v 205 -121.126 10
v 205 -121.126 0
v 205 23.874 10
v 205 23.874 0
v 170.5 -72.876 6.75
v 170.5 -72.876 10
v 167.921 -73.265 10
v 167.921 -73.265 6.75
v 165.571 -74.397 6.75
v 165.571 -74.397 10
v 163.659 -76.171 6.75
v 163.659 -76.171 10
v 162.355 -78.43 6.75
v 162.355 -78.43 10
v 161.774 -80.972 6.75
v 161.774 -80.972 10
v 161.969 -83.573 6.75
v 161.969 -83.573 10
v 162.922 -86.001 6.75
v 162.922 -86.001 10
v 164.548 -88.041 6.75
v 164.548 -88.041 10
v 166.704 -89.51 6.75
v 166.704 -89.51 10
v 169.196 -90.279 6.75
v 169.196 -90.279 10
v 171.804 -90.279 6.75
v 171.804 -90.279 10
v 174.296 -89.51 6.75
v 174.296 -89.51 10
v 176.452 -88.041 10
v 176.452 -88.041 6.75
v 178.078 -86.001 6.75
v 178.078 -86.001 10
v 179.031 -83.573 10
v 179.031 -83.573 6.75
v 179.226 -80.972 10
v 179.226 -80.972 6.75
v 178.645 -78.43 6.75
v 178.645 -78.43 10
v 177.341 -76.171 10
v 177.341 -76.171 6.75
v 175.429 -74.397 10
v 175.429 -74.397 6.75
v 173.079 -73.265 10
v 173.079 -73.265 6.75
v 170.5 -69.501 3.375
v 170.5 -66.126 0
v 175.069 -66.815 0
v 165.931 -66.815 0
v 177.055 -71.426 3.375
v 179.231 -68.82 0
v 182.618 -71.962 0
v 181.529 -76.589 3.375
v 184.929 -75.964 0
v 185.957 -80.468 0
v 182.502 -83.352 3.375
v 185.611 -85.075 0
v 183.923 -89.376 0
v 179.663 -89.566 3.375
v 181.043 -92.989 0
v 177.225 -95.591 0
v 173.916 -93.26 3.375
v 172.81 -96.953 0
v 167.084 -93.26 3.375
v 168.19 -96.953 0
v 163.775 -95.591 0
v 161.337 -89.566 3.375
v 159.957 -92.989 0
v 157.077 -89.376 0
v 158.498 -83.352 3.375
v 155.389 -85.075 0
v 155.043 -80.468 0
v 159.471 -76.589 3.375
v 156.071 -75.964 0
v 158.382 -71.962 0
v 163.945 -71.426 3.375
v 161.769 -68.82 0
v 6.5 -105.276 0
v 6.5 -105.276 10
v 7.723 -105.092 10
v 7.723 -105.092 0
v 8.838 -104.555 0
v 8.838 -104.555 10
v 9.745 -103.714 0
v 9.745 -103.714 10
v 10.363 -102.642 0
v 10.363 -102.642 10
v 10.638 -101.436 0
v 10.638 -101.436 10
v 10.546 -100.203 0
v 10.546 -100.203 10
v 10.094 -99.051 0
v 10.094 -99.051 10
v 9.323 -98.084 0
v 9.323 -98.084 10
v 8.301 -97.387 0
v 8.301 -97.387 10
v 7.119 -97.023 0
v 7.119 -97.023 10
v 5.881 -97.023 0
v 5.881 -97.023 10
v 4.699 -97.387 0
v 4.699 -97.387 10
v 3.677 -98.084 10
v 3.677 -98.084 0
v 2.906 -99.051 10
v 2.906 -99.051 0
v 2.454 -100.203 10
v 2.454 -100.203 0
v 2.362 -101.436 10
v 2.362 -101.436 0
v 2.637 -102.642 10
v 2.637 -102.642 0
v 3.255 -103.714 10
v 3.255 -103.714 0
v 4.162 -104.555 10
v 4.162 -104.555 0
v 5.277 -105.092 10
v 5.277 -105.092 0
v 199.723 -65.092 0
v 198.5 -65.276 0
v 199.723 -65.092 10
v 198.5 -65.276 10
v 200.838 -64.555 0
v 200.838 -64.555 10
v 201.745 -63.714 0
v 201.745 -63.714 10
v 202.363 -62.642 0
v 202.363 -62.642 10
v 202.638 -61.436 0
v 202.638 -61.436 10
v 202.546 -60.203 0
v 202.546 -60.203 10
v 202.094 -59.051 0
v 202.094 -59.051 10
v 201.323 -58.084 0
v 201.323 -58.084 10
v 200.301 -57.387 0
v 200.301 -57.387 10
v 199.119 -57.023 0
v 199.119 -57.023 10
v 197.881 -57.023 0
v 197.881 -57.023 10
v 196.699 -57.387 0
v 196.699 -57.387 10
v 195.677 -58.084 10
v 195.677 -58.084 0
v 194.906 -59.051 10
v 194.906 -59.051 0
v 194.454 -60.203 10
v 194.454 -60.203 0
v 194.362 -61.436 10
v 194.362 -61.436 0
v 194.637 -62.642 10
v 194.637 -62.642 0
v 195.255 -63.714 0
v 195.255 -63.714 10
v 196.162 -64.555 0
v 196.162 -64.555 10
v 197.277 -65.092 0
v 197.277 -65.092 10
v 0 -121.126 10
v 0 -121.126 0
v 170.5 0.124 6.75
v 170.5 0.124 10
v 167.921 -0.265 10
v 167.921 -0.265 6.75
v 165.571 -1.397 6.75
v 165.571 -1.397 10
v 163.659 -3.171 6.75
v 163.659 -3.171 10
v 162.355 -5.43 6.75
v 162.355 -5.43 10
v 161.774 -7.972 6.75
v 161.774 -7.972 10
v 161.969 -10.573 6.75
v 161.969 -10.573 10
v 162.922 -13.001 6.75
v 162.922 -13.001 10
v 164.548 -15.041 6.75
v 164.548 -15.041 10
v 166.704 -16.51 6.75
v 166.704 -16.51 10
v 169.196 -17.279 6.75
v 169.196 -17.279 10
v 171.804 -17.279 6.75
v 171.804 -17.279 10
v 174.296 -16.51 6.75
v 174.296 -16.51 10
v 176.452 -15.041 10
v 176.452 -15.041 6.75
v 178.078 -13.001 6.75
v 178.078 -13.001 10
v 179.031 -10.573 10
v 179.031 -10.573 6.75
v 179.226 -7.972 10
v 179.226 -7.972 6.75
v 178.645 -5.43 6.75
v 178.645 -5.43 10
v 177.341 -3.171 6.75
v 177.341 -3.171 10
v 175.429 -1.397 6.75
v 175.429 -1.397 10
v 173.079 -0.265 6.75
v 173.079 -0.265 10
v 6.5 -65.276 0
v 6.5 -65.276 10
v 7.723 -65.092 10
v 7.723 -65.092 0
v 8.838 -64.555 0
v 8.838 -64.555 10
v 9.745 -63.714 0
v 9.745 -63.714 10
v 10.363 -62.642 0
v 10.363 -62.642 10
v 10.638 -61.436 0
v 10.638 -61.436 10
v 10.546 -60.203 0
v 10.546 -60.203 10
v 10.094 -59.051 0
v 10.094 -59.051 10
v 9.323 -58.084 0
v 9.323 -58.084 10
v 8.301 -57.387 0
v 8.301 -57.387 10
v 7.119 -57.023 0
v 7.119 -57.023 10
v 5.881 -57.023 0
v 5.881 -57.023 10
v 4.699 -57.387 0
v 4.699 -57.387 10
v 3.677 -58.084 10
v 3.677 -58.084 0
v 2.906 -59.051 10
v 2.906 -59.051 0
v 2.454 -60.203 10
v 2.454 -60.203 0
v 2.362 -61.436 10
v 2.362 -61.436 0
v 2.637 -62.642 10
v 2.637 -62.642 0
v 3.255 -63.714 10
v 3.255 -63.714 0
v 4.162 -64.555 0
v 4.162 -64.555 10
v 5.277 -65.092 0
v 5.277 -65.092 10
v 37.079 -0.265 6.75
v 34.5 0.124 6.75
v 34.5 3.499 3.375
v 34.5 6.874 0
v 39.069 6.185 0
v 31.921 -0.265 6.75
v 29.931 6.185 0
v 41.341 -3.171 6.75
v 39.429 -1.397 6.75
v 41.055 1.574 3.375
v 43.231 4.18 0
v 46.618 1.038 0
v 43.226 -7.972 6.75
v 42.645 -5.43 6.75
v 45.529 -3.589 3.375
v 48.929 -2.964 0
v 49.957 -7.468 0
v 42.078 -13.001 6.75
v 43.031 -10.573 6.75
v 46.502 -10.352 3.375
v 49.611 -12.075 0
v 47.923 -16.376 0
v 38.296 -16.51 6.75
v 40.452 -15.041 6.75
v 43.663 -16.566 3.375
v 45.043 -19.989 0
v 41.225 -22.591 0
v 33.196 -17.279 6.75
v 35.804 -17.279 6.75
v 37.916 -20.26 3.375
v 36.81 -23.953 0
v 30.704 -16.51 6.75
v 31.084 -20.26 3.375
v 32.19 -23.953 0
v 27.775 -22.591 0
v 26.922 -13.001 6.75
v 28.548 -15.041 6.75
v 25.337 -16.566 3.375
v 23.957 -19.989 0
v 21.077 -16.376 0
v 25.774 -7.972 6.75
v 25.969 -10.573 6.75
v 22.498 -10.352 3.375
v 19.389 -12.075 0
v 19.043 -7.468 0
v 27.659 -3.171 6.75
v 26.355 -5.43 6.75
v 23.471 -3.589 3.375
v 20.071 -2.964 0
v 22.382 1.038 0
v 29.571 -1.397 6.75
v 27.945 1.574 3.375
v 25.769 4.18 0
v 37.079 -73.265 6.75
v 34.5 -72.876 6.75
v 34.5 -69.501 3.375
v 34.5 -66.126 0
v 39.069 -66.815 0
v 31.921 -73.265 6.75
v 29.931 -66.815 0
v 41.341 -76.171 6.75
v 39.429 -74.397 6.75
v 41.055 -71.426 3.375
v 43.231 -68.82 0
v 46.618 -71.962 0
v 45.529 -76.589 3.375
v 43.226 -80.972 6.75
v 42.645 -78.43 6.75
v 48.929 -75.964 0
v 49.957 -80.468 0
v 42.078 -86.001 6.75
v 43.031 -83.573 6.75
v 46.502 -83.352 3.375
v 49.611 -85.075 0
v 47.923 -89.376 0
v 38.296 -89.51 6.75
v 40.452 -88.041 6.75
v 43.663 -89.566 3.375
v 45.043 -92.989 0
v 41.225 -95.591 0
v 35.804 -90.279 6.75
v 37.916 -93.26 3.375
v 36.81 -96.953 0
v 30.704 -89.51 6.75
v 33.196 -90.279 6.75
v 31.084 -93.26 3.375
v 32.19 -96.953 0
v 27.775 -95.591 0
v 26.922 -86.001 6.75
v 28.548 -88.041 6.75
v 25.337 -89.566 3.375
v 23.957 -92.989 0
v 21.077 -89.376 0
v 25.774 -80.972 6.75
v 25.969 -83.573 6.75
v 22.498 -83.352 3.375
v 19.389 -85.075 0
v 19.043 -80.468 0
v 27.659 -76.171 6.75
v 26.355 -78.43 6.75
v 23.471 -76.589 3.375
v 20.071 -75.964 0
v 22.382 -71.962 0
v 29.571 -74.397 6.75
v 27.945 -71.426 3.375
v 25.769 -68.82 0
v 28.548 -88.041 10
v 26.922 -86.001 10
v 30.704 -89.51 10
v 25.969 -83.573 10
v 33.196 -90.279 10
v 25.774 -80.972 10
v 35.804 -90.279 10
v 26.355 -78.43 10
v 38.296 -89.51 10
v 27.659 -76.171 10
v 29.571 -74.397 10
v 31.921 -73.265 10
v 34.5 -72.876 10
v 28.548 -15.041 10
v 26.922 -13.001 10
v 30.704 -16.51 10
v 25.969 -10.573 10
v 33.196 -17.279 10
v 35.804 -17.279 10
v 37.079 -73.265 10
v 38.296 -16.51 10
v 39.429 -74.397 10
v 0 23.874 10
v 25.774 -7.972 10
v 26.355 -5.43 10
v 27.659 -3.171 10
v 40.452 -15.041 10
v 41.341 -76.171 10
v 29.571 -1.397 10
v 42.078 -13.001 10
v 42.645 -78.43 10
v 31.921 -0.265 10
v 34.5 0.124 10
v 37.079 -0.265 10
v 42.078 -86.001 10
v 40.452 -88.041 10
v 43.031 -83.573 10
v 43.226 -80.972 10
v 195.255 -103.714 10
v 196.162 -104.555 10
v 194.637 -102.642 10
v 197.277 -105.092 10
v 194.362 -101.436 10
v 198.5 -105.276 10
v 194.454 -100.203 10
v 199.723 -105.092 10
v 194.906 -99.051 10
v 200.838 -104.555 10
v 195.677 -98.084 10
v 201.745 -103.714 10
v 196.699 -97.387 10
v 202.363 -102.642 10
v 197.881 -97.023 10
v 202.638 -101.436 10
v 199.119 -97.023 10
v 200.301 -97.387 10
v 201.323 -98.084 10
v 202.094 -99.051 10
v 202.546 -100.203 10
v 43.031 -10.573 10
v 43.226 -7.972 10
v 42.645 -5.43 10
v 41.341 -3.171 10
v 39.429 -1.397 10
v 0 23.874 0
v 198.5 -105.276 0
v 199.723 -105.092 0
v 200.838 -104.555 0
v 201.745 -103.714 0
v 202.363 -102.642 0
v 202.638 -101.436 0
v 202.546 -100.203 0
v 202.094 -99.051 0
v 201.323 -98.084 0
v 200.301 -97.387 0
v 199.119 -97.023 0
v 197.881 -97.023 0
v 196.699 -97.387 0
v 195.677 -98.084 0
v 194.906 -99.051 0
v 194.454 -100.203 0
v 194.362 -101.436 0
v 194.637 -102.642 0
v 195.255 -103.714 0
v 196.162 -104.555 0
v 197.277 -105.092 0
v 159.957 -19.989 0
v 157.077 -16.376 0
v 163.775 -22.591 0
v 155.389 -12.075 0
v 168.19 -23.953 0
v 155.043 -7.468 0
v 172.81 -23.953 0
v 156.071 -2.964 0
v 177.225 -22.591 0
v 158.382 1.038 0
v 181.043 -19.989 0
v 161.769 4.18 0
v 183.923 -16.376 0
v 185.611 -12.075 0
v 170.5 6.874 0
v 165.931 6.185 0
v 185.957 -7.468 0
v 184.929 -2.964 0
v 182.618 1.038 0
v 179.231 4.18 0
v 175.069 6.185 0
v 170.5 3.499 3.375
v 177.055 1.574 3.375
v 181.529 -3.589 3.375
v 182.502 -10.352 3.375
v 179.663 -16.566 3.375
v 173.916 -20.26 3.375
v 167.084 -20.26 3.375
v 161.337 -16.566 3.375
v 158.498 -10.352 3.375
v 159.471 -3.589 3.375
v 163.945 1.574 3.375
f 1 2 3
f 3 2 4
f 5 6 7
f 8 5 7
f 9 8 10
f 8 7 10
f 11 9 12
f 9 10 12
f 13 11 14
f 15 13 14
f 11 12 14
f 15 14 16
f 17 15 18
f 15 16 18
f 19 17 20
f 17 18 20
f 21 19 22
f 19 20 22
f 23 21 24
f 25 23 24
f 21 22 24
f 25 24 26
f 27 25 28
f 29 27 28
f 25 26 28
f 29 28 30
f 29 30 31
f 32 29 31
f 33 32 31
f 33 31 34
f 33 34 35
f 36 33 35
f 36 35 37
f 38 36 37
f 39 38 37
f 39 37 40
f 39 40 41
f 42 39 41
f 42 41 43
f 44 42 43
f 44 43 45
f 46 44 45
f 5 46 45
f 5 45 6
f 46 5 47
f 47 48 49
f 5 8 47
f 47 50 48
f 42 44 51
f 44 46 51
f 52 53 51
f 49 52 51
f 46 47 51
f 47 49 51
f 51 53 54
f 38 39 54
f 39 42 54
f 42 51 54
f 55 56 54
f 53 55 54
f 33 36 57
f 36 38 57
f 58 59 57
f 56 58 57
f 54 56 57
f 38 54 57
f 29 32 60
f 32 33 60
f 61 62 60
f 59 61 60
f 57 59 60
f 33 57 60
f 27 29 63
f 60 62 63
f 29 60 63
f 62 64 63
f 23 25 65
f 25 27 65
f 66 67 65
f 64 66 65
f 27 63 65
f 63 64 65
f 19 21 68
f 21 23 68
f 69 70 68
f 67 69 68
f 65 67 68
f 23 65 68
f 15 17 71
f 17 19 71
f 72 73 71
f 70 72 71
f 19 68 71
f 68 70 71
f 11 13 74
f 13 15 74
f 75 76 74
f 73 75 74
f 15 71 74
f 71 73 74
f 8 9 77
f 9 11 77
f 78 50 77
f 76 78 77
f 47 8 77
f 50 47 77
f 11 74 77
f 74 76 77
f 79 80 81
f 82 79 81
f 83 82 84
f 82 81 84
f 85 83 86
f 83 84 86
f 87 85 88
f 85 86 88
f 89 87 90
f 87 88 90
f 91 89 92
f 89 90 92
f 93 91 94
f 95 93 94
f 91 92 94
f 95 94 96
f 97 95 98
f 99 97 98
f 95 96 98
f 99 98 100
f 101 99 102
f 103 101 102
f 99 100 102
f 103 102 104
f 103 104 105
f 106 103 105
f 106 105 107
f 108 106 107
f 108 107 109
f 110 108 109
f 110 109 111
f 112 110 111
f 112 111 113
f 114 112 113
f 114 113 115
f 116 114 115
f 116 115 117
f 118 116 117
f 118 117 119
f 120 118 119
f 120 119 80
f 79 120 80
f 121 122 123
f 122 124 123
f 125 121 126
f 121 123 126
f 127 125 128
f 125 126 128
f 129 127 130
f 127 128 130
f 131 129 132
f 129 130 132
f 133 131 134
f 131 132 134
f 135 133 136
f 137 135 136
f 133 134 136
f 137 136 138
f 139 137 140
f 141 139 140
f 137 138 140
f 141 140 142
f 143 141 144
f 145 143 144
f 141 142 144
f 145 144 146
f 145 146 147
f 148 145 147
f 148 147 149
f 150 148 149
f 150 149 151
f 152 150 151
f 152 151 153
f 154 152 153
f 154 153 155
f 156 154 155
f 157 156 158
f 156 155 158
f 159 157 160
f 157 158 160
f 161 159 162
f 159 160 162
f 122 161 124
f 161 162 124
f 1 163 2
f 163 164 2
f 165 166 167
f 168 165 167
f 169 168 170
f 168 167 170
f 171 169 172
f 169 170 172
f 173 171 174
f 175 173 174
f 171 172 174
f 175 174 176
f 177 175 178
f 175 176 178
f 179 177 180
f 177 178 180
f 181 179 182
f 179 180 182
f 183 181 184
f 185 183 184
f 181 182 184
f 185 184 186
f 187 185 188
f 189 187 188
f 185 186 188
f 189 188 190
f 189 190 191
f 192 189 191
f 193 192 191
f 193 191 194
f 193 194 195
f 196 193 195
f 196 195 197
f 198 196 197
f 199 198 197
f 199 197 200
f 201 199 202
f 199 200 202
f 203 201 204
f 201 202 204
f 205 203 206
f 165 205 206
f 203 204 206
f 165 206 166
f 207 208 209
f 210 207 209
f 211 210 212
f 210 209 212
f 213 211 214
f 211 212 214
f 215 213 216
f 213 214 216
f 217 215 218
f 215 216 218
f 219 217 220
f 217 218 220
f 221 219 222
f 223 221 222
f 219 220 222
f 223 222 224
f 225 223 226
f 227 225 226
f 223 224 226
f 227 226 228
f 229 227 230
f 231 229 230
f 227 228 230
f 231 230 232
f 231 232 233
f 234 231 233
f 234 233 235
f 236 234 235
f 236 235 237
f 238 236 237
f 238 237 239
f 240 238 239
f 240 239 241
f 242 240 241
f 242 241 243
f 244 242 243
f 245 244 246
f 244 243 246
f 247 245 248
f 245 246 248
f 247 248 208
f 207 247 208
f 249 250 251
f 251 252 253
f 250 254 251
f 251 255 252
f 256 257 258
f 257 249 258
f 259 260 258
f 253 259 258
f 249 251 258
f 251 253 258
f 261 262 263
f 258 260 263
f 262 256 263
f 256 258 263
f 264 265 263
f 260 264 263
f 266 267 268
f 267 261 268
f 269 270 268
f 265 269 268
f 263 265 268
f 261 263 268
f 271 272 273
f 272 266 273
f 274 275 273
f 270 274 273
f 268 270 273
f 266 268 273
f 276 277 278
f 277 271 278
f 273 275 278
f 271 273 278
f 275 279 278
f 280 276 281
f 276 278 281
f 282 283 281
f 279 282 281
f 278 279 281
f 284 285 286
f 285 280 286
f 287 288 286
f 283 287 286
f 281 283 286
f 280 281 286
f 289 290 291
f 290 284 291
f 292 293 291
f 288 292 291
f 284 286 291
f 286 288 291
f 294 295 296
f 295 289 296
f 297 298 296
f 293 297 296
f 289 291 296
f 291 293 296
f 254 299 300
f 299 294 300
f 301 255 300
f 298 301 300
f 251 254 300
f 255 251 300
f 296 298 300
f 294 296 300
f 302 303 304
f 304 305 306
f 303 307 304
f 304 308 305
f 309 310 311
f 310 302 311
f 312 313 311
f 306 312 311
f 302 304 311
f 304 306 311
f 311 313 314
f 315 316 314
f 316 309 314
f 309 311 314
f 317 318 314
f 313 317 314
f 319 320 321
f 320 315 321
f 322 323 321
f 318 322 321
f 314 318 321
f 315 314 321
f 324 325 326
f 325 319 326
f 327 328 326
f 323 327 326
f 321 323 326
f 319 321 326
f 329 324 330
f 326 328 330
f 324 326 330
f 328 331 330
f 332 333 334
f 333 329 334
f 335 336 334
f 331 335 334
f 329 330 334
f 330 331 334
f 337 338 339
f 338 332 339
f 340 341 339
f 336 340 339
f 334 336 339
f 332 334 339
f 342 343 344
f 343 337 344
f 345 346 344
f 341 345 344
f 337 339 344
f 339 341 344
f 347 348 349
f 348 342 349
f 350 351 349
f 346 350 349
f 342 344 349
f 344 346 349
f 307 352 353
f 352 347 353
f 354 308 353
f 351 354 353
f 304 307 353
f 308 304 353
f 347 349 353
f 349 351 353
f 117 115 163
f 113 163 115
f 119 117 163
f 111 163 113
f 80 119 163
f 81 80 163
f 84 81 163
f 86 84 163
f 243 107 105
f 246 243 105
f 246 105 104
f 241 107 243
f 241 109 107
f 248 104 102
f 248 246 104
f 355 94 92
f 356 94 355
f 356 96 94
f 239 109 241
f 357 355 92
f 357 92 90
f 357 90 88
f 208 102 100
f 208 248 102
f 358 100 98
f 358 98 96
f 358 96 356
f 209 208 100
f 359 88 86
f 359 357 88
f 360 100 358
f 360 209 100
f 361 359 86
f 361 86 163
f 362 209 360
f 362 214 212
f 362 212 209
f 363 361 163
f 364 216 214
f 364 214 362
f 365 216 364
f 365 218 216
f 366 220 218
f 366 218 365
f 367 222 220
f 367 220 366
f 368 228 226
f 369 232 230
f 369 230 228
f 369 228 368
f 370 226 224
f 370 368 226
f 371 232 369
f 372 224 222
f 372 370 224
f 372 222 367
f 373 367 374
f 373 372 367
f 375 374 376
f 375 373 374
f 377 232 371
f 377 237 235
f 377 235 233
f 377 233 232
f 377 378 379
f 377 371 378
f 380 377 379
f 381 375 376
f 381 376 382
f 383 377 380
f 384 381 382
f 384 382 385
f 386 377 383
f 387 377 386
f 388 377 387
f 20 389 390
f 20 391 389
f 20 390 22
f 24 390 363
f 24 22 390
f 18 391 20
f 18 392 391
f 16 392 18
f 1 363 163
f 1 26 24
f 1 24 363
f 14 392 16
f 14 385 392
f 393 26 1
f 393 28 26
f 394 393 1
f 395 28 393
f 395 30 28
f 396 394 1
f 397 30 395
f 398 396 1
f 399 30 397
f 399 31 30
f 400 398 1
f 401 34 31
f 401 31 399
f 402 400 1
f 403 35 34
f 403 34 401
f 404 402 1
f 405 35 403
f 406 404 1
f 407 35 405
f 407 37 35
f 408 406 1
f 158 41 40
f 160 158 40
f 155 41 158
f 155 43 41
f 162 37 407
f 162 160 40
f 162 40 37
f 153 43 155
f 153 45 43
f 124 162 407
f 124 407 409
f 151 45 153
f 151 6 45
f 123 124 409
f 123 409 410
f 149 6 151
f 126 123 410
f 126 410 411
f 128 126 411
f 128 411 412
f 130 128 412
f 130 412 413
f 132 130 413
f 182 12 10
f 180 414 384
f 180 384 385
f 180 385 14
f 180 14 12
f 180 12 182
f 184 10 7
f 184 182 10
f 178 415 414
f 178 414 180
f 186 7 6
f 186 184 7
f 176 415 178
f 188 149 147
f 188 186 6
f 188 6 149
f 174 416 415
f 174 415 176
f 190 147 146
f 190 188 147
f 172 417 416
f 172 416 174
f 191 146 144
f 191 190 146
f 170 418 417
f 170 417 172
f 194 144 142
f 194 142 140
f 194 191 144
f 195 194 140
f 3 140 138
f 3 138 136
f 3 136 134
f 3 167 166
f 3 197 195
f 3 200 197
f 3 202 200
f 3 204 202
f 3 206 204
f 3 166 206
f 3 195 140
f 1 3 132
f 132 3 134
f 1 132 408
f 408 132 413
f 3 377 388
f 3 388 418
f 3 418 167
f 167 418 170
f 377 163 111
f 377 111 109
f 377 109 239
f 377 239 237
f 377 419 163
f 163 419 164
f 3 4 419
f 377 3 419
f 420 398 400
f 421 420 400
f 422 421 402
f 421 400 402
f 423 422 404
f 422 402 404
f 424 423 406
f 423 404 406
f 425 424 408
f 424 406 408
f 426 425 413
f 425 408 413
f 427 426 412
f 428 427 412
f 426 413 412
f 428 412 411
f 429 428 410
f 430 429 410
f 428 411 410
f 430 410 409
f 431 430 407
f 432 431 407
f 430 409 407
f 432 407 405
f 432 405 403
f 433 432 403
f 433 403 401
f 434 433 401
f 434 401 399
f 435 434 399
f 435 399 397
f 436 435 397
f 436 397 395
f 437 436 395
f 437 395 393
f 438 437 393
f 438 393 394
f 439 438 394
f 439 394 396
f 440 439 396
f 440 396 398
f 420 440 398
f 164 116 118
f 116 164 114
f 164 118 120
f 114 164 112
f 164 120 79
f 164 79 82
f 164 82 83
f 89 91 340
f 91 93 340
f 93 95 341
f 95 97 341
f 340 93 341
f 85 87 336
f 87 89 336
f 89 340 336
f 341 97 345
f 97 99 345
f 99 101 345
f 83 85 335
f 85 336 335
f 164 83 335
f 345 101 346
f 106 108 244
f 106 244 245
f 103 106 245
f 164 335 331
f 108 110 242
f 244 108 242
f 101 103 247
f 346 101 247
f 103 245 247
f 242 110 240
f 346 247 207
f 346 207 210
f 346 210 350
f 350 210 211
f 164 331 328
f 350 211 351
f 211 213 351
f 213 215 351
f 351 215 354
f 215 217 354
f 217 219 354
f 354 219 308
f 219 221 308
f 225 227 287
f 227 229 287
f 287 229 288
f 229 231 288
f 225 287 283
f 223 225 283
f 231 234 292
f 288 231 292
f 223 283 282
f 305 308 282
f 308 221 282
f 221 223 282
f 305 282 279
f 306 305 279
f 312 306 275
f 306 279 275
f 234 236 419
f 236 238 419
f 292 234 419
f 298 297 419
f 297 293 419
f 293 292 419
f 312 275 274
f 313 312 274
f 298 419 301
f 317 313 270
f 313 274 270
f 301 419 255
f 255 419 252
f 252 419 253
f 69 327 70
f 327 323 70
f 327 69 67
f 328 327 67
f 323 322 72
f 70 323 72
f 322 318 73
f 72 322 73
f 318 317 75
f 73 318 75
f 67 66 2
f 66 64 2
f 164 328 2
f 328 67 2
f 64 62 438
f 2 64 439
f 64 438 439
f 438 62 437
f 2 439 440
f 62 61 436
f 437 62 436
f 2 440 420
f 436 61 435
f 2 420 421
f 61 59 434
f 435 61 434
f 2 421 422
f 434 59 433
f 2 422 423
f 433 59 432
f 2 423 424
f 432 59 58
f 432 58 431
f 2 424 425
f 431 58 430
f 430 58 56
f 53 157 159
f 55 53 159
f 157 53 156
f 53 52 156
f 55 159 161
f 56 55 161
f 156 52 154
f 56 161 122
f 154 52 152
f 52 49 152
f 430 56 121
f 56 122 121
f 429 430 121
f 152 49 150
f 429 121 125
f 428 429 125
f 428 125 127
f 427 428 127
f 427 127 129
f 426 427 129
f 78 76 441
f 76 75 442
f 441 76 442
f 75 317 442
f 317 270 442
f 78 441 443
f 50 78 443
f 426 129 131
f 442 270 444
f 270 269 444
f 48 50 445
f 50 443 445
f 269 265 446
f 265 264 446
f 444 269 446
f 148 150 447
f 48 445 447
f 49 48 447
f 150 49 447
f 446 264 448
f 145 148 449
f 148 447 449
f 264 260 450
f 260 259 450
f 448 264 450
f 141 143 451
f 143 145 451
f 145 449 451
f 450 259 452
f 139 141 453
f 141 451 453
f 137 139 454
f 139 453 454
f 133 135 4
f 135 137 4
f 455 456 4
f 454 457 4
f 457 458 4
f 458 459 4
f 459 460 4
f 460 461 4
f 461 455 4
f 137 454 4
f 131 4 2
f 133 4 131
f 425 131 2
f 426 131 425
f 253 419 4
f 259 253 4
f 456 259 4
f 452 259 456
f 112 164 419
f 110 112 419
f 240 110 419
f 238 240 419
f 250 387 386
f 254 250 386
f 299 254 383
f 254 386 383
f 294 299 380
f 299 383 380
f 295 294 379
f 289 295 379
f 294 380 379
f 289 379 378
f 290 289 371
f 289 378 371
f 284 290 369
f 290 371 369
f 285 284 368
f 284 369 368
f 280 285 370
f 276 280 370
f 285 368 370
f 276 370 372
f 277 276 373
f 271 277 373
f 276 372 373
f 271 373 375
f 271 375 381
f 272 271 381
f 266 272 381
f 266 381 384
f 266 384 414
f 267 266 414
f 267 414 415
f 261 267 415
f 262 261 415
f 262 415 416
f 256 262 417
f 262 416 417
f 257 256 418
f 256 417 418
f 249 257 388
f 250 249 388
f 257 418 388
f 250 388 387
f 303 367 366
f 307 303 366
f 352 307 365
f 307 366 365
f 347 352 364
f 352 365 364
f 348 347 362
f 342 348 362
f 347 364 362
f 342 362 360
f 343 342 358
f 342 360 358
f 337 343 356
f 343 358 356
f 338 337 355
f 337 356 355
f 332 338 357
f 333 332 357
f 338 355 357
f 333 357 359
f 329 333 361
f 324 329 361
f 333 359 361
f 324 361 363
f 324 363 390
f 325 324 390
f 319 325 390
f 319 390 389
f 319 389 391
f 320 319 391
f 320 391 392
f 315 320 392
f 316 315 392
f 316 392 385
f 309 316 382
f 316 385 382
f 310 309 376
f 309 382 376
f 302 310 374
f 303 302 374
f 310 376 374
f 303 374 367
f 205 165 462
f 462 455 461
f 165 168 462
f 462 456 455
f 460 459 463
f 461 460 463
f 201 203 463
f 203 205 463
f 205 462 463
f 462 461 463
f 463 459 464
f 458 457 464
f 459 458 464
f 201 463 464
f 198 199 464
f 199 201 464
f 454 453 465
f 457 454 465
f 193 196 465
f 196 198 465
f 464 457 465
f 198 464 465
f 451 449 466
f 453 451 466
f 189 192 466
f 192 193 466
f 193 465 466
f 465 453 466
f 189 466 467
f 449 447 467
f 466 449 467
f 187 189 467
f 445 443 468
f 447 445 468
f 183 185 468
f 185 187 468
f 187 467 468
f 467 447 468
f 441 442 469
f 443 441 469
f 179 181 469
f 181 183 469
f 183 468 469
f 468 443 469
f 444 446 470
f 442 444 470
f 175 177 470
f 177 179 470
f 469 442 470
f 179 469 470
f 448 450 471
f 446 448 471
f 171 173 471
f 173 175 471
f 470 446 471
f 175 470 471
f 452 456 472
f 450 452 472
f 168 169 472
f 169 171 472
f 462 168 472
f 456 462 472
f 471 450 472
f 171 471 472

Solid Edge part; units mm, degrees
sketch "Sketch1" plane through (0, 0, 0) normal (0, 0, 1) x (1, 0, 0)
  line L0 (0, -121.1263) -> (205, -121.1263)
  line L1 (205, -121.1263) -> (205, 23.8737)
  line L2 (205, 23.8737) -> (0, 23.8737)
  line L3 (0, 23.8737) -> (0, -121.1263)
  dimension "D1" = 205
  dimension "D2" = 145
extrude "Protrusion1" add sketch "Sketch1" along normal blind 10
hole "Hole1" at (198.5, -61.1263, 10) direction (0, 0, -1) diameter 8.3 end through all
hole "Hole2" at (198.5, -101.1263, 10) direction (0, 0, -1) diameter 8.3 end through all
hole "Hole3" at (6.5, -101.1263, 10) direction (0, 0, -1) diameter 8.3 end through all
hole "Hole4" at (6.5, -61.1263, 10) direction (0, 0, -1) diameter 8.3 end through all
hole "Hole_7" at (34.5, -8.6263, 0) direction (0, 0, 1) diameter 17.5 depth 50.8 countersink diameter 31 countersink angle 90
hole "Hole5" at (34.5, -81.6263, 0) direction (0, 0, 1) diameter 17.5 depth 50.8 countersink diameter 31 countersink angle 90
hole "Hole6" at (170.5, -81.6263, 0) direction (0, 0, 1) diameter 17.5 depth 50.8 countersink diameter 31 countersink angle 90
hole "Hole7" at (170.5, -8.6263, 0) direction (0, 0, 1) diameter 17.5 depth 50.8 countersink diameter 31 countersink angle 90
properties material "Aluminum, 6061-T6"
